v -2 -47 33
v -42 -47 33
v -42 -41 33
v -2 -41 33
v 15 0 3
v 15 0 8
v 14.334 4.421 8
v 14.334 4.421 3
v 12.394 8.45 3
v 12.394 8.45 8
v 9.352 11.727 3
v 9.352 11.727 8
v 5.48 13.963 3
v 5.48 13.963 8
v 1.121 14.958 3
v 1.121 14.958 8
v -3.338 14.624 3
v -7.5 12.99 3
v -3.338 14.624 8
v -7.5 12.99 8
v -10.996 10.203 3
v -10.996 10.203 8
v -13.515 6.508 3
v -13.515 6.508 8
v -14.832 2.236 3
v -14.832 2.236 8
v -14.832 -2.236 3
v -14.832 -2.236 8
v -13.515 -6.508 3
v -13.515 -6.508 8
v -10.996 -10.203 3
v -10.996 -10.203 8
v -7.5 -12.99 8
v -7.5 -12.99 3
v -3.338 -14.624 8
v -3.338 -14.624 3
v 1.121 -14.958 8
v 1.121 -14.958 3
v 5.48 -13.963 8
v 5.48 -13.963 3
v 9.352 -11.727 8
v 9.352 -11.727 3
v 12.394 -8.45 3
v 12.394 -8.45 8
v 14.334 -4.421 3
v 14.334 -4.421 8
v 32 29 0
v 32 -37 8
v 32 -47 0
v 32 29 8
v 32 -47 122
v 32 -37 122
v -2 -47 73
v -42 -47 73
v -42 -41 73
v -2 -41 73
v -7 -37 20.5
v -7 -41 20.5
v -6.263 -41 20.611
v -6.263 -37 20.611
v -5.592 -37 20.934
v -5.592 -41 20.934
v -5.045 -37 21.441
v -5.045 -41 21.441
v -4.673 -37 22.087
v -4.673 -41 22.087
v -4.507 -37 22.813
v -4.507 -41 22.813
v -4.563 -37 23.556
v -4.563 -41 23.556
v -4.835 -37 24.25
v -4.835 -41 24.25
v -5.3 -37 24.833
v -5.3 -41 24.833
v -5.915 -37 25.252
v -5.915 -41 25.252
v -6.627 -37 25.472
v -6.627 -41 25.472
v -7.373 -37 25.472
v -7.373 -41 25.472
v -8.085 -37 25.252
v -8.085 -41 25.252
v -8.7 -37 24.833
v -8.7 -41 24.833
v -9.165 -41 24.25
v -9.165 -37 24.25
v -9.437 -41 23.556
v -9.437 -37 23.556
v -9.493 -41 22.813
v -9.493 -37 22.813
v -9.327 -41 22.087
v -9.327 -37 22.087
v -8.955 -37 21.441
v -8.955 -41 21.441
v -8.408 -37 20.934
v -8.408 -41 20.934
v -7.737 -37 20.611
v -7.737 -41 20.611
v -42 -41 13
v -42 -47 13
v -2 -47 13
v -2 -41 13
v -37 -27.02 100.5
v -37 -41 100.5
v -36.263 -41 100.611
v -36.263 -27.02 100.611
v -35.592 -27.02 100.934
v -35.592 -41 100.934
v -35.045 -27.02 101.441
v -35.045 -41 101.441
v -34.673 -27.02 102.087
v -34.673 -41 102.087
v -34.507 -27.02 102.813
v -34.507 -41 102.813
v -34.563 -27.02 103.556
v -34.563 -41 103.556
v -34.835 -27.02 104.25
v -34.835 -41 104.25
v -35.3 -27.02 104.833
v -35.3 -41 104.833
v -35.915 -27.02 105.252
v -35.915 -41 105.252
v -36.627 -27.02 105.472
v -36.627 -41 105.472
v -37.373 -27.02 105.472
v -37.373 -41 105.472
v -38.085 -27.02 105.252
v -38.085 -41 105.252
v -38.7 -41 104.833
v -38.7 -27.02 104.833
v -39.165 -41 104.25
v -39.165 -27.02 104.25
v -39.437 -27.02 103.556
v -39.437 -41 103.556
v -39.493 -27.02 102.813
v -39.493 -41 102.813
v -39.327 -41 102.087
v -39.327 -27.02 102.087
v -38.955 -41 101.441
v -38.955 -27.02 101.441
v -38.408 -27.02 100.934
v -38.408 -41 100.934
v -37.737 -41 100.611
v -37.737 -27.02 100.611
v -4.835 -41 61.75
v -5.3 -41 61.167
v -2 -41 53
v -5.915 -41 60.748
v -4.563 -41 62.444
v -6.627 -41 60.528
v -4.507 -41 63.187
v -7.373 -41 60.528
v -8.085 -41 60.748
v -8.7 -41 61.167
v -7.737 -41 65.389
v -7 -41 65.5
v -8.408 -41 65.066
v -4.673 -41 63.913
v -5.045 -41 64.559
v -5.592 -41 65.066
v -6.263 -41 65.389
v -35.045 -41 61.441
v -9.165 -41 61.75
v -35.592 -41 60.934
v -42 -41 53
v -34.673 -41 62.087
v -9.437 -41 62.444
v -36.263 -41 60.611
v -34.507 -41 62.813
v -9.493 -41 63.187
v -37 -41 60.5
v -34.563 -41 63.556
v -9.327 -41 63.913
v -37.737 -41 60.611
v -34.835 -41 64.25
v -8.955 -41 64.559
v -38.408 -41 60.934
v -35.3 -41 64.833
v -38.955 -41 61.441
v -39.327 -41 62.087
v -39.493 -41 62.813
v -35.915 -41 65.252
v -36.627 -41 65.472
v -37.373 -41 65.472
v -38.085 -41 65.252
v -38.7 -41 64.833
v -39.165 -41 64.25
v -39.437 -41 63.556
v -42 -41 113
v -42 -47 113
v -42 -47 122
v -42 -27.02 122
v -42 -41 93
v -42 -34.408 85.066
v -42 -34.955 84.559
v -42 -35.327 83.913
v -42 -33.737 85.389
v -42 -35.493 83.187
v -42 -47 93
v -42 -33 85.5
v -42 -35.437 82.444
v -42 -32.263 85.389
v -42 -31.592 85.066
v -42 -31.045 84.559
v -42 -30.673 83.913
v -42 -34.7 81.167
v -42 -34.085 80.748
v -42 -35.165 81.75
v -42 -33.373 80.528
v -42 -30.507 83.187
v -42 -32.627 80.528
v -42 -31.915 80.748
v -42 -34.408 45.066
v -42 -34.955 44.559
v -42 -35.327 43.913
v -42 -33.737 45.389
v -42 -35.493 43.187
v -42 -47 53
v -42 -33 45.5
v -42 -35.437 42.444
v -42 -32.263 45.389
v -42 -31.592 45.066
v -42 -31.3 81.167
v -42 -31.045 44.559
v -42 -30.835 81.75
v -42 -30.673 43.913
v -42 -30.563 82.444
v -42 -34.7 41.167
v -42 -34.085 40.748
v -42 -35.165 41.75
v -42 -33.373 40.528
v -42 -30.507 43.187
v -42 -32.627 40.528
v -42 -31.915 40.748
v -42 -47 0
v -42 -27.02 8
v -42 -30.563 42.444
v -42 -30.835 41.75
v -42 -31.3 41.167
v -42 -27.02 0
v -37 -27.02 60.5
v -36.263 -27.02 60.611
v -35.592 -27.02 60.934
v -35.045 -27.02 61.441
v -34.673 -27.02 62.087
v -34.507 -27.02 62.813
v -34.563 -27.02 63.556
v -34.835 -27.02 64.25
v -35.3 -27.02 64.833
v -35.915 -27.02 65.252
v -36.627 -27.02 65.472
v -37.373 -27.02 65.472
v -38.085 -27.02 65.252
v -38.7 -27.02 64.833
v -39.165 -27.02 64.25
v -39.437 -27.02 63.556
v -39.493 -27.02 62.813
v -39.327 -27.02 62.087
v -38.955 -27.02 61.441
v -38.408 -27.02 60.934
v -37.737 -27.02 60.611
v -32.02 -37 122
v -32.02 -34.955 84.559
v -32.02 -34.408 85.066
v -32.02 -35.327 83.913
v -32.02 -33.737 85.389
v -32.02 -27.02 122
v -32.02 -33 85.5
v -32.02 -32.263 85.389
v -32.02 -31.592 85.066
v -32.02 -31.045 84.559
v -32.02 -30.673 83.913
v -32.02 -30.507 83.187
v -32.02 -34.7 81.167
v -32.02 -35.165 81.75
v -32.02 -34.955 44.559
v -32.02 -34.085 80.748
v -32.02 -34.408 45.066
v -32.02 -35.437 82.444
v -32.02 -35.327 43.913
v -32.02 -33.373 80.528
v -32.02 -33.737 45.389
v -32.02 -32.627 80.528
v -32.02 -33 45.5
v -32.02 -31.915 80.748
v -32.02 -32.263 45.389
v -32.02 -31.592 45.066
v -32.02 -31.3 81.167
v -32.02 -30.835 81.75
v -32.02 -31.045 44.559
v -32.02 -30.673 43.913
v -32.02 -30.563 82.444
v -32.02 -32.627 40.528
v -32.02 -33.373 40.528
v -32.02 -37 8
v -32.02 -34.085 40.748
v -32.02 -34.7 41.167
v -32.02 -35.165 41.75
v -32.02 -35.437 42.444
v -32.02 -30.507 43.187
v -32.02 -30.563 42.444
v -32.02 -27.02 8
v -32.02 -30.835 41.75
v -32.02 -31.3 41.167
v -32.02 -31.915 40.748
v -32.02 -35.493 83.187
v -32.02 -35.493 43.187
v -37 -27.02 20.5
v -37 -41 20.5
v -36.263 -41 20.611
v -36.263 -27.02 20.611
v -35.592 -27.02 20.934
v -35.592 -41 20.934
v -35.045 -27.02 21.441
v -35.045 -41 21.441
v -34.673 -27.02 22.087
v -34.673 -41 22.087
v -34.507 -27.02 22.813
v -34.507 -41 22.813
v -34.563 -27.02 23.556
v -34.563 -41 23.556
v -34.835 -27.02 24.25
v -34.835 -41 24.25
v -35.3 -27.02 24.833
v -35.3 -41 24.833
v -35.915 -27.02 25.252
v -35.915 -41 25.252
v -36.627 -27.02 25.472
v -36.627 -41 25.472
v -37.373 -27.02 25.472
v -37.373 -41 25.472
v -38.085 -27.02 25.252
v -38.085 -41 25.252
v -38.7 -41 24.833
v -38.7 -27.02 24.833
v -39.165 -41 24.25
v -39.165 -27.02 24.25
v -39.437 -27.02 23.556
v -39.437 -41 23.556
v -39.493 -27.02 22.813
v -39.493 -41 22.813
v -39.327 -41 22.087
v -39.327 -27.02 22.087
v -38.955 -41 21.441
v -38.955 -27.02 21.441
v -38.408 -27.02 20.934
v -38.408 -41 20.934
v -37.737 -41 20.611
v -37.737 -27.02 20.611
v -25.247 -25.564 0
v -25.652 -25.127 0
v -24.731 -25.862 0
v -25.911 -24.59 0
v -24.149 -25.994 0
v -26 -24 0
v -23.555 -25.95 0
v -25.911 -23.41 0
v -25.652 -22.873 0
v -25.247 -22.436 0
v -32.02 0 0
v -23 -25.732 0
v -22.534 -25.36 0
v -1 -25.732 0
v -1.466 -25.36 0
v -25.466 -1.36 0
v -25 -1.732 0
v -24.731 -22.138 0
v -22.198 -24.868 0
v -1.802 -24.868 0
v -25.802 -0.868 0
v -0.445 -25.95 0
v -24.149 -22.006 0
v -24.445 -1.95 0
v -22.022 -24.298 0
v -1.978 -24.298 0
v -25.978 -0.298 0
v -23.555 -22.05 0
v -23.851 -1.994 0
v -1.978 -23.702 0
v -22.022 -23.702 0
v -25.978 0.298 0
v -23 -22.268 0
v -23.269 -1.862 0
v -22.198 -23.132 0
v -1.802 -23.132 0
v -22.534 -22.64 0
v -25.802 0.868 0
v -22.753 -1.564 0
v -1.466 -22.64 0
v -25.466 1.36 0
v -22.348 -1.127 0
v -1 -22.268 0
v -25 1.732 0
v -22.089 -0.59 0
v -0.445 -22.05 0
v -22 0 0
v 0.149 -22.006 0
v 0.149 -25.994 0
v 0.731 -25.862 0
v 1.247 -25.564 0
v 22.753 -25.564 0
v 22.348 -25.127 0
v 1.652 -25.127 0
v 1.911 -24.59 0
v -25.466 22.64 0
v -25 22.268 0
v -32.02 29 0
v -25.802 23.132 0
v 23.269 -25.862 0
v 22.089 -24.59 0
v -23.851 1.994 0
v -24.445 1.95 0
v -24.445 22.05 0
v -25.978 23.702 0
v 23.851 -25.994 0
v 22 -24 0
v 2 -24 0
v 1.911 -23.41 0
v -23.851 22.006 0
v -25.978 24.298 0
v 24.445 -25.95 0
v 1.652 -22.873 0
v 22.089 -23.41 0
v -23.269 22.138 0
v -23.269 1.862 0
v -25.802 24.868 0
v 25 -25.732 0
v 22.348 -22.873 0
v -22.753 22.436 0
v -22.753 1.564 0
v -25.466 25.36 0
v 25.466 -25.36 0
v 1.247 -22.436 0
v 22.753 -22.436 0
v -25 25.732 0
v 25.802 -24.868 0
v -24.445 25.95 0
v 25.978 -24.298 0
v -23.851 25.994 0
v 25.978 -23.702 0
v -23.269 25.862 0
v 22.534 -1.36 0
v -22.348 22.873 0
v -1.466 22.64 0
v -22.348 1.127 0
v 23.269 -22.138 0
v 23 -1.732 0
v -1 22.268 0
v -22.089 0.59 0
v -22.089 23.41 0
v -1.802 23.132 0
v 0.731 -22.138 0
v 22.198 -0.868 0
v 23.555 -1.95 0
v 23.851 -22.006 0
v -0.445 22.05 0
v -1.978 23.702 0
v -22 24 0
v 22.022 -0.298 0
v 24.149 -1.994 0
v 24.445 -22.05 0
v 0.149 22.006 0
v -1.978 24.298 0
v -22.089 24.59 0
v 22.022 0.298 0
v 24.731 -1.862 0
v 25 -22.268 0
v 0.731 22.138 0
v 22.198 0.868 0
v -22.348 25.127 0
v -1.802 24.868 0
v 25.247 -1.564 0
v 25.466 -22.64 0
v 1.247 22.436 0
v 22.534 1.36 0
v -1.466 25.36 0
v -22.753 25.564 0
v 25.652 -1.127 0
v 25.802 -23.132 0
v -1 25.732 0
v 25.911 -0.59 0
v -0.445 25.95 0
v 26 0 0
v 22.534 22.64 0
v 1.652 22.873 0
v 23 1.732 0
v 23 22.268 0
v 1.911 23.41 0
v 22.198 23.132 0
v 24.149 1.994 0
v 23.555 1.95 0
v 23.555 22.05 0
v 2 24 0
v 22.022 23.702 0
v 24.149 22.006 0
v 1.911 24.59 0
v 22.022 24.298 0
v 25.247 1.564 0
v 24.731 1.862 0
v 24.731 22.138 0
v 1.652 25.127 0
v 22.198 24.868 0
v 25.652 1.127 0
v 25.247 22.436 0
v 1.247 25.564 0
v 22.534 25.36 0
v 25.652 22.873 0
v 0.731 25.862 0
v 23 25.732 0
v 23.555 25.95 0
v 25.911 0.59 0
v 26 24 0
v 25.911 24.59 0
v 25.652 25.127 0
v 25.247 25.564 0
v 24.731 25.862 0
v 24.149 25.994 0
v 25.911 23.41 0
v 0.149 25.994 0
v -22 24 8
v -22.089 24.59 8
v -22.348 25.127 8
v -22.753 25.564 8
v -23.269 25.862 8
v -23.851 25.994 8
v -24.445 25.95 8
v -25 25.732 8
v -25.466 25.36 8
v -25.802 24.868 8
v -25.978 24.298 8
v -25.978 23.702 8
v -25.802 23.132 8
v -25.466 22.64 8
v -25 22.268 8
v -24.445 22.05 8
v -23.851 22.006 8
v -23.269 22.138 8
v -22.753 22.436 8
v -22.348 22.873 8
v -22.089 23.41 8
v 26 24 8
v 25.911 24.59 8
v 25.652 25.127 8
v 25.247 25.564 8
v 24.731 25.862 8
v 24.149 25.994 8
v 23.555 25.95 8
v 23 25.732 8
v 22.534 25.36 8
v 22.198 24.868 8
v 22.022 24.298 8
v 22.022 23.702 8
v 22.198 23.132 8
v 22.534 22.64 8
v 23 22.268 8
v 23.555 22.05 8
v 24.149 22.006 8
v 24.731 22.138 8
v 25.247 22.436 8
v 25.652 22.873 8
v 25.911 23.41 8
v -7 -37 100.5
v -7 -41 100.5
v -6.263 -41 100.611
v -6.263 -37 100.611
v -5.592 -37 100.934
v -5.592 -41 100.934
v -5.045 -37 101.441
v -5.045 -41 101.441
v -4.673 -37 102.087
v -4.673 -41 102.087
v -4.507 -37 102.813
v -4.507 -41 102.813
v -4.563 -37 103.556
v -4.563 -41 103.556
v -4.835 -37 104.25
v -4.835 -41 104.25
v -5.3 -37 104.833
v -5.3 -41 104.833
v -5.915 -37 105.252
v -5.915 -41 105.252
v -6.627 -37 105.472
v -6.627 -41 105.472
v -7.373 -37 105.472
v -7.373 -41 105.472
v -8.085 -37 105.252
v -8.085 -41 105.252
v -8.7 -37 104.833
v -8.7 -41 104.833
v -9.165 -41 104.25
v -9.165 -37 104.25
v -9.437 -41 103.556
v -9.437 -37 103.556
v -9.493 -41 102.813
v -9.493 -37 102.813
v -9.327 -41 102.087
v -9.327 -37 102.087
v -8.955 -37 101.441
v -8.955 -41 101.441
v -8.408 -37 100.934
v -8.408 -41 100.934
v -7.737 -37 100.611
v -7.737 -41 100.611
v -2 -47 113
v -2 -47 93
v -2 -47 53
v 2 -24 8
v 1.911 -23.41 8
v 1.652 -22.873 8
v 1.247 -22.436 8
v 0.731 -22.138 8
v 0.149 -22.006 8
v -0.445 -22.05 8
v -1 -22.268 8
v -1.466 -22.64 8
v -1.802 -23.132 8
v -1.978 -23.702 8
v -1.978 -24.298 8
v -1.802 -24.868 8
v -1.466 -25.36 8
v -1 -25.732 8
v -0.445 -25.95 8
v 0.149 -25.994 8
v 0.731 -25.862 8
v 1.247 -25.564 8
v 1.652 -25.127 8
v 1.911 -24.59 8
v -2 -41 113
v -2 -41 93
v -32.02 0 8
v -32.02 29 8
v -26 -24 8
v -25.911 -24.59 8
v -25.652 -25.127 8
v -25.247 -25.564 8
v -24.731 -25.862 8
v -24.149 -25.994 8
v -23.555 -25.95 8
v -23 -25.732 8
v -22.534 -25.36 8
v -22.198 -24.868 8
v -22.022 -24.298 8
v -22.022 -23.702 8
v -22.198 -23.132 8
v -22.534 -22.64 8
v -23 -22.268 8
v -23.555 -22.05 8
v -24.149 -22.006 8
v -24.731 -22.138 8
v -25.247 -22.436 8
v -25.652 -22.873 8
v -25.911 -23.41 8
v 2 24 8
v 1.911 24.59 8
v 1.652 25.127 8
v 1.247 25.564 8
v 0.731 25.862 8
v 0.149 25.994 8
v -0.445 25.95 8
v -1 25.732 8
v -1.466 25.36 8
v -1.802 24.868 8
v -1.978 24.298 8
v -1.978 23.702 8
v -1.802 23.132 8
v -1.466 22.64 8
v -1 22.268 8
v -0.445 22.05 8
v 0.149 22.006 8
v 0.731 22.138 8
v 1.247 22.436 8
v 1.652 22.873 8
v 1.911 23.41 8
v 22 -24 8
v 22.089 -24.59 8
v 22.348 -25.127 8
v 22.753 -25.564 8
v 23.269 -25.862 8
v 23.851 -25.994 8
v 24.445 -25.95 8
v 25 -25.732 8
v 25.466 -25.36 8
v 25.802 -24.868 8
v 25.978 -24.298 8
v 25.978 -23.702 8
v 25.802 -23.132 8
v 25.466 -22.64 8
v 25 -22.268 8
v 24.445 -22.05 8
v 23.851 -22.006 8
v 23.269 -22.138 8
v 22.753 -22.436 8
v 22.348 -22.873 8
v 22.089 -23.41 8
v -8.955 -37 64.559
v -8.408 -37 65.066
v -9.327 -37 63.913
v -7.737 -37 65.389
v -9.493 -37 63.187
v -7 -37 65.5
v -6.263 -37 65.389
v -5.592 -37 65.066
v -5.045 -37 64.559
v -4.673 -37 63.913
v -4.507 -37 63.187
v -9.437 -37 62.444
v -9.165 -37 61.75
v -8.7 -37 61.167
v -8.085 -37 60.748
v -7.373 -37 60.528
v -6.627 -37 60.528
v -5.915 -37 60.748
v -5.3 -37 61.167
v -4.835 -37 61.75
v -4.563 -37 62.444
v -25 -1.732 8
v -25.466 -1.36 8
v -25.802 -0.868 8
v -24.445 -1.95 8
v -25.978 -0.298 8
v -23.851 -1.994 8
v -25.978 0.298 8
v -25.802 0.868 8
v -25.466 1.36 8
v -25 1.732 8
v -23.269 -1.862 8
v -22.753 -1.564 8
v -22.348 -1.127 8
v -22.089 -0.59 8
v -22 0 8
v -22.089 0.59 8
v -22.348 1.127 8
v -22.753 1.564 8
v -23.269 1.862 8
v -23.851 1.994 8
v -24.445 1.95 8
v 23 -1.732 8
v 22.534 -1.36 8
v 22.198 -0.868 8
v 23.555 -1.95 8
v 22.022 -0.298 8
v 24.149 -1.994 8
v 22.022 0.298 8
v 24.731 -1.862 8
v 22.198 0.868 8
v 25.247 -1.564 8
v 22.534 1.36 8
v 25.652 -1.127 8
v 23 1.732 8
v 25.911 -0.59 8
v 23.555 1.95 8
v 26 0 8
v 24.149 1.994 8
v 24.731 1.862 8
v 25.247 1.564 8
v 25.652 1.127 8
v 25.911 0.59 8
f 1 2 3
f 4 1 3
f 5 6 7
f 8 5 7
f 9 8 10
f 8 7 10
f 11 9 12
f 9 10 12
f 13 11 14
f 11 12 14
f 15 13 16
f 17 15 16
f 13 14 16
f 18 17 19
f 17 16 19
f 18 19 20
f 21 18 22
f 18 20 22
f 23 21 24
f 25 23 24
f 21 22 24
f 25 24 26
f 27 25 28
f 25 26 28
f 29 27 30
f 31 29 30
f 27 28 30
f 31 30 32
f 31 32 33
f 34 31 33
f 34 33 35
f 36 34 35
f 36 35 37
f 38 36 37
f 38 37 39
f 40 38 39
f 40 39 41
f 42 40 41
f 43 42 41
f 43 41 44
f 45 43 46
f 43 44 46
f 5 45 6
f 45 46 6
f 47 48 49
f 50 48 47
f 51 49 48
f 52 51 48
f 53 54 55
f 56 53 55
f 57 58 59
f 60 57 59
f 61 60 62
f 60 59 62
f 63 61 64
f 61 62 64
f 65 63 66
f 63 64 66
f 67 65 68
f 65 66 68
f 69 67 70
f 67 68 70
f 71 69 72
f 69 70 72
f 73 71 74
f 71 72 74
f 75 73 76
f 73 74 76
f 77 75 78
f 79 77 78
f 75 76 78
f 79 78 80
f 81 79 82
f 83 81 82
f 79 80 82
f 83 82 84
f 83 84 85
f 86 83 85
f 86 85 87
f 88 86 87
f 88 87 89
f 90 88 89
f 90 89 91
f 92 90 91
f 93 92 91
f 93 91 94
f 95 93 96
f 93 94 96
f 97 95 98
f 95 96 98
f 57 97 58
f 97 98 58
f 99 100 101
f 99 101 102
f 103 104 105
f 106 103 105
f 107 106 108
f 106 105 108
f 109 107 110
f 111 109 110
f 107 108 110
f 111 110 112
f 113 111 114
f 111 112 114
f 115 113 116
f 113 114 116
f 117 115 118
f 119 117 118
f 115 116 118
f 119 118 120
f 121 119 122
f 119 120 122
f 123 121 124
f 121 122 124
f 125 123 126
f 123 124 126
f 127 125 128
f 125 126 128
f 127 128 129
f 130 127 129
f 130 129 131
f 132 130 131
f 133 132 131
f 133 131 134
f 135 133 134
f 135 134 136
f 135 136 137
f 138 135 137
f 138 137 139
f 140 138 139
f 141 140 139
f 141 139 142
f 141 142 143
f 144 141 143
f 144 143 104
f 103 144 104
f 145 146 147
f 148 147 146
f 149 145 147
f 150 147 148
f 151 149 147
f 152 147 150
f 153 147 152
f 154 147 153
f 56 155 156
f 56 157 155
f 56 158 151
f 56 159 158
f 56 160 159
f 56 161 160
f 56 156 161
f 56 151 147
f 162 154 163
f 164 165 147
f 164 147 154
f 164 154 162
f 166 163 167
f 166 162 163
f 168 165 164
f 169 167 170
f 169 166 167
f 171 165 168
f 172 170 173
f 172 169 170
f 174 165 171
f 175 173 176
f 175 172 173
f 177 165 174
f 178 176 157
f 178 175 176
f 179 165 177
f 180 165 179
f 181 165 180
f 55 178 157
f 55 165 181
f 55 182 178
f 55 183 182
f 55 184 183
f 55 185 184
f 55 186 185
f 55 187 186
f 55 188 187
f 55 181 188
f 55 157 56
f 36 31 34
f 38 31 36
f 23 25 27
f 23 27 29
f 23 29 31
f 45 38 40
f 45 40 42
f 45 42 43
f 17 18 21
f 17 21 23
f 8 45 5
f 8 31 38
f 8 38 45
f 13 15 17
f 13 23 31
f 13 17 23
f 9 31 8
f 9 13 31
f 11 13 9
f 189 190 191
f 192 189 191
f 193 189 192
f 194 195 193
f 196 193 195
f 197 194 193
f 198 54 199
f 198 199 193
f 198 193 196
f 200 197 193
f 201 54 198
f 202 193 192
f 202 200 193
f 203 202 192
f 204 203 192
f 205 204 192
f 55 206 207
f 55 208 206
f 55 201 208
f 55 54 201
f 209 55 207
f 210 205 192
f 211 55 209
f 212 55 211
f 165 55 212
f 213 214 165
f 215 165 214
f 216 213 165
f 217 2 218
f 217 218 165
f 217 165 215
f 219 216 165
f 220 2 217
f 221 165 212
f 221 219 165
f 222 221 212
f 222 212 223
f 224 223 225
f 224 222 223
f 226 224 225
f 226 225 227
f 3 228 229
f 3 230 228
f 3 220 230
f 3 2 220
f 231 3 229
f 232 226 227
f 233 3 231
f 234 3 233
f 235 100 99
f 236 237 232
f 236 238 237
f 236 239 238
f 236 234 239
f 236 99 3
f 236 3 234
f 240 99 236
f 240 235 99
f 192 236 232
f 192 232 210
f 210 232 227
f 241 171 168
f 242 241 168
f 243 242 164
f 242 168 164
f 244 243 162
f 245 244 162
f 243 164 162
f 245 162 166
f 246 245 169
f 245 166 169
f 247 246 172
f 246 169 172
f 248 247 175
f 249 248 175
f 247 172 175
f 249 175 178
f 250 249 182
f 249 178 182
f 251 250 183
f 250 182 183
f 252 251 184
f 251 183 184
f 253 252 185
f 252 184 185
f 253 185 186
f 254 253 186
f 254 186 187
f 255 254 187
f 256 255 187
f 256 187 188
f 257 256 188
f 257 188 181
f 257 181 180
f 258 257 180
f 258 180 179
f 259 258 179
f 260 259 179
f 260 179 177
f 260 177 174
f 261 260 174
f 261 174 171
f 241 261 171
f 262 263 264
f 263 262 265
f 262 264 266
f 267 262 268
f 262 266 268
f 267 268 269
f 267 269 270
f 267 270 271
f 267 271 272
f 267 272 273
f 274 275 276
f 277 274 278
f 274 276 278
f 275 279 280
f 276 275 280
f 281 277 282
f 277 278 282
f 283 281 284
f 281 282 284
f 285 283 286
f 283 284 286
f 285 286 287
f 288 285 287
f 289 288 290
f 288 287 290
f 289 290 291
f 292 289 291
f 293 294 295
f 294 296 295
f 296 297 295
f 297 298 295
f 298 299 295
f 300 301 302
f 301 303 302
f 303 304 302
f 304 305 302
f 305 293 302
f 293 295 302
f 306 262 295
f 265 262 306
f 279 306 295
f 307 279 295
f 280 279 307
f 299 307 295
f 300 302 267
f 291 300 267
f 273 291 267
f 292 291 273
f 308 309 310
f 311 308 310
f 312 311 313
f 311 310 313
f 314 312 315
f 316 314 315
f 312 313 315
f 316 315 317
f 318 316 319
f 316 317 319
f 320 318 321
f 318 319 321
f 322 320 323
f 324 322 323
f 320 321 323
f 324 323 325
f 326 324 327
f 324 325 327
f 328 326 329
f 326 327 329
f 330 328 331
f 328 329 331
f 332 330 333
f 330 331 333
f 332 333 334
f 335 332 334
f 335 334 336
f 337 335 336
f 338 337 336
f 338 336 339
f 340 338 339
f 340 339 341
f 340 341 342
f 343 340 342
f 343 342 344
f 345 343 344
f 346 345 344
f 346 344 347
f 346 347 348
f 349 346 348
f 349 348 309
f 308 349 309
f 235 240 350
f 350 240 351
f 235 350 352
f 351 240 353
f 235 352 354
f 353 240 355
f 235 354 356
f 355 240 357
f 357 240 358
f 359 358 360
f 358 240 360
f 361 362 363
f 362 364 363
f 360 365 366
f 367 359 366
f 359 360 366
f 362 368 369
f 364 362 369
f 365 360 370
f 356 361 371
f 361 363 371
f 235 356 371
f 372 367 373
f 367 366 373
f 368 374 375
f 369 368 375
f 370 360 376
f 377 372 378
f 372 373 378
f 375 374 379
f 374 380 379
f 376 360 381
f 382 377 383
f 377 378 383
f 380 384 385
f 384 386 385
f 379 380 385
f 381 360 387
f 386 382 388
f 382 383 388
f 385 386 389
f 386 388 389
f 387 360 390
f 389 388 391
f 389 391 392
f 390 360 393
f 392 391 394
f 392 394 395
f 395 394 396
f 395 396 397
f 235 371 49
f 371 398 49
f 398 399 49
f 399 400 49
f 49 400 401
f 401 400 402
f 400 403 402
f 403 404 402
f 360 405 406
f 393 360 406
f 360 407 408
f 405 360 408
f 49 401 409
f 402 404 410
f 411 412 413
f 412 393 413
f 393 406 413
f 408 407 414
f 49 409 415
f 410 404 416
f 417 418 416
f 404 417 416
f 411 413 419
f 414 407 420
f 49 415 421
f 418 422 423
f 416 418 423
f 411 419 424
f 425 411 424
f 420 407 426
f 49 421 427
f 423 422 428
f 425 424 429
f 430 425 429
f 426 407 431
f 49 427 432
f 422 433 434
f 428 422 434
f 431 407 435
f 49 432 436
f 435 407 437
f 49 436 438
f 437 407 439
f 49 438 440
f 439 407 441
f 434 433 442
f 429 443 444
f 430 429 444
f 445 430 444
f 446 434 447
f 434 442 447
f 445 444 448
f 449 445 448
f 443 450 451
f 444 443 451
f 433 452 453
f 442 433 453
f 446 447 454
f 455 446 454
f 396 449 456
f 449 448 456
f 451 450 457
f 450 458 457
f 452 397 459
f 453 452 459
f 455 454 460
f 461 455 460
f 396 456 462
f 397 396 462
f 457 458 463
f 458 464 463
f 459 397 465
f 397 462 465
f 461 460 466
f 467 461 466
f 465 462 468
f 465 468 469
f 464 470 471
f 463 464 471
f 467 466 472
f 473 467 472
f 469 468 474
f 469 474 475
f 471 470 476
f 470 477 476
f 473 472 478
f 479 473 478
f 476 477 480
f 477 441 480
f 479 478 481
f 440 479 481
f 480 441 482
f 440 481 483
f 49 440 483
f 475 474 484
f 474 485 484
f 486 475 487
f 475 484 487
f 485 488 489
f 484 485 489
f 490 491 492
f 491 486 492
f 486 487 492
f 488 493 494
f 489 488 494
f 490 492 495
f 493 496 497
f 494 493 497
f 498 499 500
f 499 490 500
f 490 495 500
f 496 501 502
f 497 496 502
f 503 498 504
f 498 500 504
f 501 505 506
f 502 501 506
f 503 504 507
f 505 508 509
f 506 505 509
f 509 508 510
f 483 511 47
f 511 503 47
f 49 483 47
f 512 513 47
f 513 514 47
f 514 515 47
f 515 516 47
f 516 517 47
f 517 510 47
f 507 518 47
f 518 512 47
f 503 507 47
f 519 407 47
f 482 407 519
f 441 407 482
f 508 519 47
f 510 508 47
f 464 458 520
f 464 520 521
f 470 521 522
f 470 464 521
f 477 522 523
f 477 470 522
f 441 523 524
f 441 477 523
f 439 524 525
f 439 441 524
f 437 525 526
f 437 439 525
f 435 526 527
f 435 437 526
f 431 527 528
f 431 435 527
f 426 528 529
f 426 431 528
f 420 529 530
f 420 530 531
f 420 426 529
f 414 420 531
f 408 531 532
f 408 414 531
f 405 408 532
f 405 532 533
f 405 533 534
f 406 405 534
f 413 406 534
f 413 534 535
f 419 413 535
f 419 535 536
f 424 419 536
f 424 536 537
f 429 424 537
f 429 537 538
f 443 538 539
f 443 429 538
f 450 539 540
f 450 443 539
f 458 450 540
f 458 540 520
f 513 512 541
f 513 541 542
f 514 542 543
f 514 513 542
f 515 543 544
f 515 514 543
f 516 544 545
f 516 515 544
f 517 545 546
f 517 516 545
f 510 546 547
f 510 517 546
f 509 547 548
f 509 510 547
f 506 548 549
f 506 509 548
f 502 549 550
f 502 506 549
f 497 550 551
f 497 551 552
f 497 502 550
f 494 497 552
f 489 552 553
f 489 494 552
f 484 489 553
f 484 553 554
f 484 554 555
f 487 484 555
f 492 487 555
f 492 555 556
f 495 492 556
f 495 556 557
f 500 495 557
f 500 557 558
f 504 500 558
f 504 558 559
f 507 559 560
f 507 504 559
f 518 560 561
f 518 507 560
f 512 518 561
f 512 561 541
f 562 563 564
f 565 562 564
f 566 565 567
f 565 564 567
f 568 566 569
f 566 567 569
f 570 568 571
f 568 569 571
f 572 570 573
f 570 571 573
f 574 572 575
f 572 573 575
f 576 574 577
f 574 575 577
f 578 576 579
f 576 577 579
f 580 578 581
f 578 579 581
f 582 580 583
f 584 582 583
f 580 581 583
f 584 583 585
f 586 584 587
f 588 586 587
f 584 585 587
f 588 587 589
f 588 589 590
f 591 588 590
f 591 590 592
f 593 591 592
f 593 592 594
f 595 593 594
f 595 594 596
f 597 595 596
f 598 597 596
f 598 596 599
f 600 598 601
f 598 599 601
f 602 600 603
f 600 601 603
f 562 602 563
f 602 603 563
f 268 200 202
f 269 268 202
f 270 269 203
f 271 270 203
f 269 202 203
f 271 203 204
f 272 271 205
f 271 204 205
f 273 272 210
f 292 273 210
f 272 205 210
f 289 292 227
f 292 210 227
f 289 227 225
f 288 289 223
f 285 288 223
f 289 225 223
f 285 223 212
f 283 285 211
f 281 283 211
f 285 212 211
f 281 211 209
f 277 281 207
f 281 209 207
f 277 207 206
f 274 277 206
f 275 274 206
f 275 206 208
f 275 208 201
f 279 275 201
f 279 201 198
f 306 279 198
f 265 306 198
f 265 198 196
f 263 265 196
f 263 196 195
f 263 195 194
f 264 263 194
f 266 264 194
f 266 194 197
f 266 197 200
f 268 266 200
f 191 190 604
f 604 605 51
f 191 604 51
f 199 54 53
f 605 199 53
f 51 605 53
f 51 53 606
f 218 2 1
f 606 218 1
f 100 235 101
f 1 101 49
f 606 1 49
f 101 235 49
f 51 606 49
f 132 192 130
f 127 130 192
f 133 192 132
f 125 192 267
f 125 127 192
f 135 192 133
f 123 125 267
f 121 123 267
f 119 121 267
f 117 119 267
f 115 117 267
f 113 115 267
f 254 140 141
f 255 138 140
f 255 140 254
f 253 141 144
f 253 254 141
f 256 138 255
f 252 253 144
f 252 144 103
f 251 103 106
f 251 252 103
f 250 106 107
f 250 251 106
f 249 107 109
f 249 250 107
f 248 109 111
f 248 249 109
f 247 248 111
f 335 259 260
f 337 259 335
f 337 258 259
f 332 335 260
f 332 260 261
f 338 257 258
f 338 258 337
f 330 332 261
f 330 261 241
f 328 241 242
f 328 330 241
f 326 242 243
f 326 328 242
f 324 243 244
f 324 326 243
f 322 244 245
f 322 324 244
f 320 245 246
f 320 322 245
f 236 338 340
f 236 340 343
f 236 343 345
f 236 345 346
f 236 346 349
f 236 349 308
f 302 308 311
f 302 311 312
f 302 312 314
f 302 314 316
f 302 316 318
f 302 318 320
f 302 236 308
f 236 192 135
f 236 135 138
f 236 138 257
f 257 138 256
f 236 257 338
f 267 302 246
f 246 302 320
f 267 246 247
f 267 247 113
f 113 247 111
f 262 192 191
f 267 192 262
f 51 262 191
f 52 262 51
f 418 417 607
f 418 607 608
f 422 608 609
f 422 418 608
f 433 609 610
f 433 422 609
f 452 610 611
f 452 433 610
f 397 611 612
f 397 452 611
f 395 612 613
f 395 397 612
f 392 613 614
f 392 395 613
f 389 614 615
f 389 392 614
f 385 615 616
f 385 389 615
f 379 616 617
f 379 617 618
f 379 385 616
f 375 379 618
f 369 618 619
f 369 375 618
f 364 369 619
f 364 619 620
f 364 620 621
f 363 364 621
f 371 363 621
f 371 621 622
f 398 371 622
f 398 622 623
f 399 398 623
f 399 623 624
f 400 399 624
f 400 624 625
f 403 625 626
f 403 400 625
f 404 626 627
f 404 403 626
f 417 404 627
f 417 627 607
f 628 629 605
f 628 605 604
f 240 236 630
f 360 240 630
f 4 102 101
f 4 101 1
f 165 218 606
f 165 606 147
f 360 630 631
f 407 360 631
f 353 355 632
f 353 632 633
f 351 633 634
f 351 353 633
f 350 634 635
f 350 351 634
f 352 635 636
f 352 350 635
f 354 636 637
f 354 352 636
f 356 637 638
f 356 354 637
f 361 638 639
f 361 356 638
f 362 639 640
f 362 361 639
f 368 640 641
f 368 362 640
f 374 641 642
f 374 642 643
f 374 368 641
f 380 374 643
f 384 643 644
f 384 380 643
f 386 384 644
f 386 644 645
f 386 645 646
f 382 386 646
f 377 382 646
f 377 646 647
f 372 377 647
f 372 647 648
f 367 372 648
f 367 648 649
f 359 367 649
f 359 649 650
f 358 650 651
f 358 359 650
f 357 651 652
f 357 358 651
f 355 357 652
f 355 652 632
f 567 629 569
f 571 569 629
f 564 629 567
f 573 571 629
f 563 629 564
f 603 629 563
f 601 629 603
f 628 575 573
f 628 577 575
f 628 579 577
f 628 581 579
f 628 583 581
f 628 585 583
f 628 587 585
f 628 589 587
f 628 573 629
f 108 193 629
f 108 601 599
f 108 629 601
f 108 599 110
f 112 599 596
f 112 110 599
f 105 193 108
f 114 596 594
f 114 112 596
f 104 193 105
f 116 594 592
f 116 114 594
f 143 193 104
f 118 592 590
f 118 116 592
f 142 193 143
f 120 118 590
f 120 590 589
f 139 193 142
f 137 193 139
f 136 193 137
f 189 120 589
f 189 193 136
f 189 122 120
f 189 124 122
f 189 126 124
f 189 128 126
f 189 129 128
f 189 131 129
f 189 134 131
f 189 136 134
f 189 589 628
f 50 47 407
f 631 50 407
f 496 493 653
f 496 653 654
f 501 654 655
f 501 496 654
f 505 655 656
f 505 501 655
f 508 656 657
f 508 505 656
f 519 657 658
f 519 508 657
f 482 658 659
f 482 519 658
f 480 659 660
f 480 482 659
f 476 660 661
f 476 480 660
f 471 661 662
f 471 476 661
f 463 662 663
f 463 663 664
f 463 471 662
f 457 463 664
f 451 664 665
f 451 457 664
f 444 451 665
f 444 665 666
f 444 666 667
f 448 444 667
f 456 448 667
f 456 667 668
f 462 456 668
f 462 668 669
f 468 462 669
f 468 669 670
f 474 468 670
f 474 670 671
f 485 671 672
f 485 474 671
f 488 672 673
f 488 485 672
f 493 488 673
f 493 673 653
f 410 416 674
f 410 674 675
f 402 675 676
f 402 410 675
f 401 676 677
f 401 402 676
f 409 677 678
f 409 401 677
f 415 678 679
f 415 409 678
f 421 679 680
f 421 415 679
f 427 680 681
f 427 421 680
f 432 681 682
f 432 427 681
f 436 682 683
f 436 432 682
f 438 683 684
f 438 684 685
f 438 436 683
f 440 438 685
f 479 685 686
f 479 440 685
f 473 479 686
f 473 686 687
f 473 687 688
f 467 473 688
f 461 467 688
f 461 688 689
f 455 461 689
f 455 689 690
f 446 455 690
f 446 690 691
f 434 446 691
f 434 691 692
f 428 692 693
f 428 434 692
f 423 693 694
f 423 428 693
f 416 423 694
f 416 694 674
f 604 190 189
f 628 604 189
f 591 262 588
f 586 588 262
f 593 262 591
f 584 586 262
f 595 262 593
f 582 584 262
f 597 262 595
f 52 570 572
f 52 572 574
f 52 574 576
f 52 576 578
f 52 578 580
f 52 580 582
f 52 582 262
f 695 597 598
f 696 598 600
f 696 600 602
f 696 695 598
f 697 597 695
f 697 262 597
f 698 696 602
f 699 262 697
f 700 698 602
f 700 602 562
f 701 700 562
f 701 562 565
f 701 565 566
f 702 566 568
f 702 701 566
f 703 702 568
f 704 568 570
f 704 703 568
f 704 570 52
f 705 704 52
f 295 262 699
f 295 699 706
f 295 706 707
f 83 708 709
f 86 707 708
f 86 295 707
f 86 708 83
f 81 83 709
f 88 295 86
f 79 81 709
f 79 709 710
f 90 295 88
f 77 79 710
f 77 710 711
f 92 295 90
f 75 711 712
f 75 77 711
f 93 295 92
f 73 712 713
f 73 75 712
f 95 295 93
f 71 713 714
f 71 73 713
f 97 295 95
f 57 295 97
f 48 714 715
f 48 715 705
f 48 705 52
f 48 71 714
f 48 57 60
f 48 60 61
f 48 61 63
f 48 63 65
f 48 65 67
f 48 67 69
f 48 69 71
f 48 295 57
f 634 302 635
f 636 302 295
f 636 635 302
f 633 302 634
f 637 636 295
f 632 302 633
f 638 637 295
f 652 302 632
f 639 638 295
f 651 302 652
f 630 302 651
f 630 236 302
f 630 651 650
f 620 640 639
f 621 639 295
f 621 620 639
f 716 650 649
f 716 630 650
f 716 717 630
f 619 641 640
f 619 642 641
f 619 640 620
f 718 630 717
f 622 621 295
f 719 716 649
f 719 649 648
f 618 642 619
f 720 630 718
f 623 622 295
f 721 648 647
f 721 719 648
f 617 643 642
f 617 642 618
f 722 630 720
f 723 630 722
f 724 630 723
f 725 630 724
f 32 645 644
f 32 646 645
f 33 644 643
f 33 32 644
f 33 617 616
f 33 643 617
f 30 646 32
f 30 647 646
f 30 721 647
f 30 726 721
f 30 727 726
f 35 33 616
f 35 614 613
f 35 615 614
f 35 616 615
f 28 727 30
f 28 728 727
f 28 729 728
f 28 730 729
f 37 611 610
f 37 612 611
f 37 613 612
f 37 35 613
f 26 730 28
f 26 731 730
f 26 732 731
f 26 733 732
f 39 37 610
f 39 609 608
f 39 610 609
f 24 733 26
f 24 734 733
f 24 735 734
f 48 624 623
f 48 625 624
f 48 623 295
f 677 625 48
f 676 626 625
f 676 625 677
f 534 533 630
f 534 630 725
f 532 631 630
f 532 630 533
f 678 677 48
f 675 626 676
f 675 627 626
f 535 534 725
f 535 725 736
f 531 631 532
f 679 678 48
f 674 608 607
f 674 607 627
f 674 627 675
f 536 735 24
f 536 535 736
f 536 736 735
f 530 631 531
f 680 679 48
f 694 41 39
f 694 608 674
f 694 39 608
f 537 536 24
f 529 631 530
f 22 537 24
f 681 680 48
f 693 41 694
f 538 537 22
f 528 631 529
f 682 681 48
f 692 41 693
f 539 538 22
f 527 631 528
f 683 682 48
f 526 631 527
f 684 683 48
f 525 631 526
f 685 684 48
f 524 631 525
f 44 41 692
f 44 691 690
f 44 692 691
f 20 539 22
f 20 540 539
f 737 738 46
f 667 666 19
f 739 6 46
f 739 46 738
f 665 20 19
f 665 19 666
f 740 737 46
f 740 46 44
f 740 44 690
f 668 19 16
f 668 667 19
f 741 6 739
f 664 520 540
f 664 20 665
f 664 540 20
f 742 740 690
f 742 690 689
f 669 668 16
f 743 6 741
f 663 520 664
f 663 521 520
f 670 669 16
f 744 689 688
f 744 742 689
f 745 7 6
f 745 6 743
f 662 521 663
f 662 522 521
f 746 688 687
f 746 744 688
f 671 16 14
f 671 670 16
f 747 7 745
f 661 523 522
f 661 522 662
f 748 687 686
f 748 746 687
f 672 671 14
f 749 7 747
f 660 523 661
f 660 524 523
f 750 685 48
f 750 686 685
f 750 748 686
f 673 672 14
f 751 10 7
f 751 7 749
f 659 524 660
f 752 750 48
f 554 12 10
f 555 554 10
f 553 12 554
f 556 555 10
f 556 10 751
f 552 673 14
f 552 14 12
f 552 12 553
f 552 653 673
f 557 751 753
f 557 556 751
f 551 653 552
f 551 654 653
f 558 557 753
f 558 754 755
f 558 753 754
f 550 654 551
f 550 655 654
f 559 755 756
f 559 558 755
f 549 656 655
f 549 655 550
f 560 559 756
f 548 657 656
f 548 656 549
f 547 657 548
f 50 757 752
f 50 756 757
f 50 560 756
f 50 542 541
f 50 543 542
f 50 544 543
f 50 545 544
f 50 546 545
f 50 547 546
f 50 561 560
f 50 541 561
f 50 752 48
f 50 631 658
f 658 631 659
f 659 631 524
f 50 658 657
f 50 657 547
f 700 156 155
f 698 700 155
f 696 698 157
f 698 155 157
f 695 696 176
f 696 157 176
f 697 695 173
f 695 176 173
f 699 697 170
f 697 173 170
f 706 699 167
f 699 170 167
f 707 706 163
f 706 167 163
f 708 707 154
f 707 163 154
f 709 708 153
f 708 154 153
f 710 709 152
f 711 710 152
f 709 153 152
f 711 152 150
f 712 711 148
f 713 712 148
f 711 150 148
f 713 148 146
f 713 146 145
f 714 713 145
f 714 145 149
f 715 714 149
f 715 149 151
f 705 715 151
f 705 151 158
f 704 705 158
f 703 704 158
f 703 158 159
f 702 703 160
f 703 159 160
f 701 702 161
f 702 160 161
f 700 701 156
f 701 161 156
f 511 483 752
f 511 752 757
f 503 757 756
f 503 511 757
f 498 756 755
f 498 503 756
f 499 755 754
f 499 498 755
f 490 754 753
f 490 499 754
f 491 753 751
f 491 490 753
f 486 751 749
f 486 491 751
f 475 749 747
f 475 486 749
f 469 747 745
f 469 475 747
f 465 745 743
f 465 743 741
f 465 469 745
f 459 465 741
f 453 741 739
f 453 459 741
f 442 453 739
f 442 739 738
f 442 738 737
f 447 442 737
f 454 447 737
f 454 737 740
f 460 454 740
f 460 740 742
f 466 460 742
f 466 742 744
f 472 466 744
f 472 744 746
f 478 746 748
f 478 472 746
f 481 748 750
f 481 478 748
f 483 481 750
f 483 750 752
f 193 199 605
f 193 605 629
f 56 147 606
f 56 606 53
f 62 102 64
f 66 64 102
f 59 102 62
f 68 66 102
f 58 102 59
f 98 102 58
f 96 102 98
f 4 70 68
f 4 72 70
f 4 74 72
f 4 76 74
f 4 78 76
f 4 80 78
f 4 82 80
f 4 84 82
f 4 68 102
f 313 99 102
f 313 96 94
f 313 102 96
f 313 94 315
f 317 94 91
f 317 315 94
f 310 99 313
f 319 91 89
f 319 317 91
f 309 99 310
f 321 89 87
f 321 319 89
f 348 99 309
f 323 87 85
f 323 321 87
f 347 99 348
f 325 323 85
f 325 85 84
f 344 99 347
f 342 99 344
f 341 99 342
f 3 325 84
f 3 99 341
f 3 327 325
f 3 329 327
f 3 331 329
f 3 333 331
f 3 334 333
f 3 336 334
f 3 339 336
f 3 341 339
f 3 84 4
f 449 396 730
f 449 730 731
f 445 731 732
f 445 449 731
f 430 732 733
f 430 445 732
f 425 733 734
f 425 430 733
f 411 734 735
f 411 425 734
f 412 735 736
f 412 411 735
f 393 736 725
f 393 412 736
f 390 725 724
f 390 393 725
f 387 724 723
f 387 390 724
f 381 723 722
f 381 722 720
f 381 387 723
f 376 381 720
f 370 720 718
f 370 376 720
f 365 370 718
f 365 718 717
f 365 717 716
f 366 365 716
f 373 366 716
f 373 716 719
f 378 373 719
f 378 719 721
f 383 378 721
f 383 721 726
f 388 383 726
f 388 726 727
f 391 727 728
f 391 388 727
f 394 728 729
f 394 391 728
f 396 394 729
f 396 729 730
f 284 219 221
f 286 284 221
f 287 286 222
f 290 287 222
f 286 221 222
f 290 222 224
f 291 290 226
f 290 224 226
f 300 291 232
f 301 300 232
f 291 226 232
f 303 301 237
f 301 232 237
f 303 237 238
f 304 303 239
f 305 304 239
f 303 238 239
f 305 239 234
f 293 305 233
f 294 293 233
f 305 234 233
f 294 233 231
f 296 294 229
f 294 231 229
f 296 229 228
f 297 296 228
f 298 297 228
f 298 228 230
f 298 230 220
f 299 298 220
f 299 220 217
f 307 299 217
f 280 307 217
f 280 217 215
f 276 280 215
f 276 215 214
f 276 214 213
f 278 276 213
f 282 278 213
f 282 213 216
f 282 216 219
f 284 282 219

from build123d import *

# Parameters (mm, degrees)
SKETCH1_W           = 58
SKETCH1_H           = 58
SKETCH1_R           = 2
BOSS_EXTRUDE1_DEPTH = 8
SKETCH13_R          = 15
CUT_EXTRUDE5_DEPTH  = 5
BOSS_EXTRUDE7_DEPTH = 8
SKETCH21_W          = 84
SKETCH21_H          = 10
BOSS_EXTRUDE8_DEPTH = 114
SKETCH22_W          = 9.98
SKETCH22_H          = 9.98
BOSS_EXTRUDE9_DEPTH = 114
SKETCH29_W          = 20
SKETCH29_H          = 6
CUT_EXTRUDE6_DEPTH  = 40
SKETCH30_W          = 10
SKETCH30_H          = 76
CUT_EXTRUDE7_DEPTH  = 138.320792308
SKETCH31_R          = 2.5
CUT_EXTRUDE8_DEPTH  = 4
SKETCH34_R          = 2.5
CUT_EXTRUDE9_DEPTH  = 10
SKETCH36_R          = 2.5
CUT_EXTRUDE10_DEPTH = 20
CUT_EXTRUDE12_DEPTH = 15


with BuildPart() as part:
    # Sketch1 → Boss-Extrude1 (new body)
    with BuildSketch(Plane.XY):
        Rectangle(SKETCH1_W, SKETCH1_H)
        with Locations((0, 24)):
            Circle(SKETCH1_R, mode=Mode.SUBTRACT)
        with Locations((-24, 24)):
            Circle(SKETCH1_R, mode=Mode.SUBTRACT)
        with Locations((24, 0)):
            Circle(SKETCH1_R, mode=Mode.SUBTRACT)
        with Locations((0, -24)):
            Circle(SKETCH1_R, mode=Mode.SUBTRACT)
        with Locations((-24, 0)):
            Circle(SKETCH1_R, mode=Mode.SUBTRACT)
        with Locations(Location((24, -24, 0), (0, 0, 180))):
            Circle(SKETCH1_R, mode=Mode.SUBTRACT)
        with Locations((24, 24)):
            Circle(SKETCH1_R, mode=Mode.SUBTRACT)
        with Locations(Location((-24, -24, 0), (0, 0, 180))):
            Circle(SKETCH1_R, mode=Mode.SUBTRACT)
    extrude(amount=BOSS_EXTRUDE1_DEPTH)

    # Sketch13 → Cut-Extrude5 (cut)
    with BuildSketch(Plane.XY.offset(8)):
        Circle(SKETCH13_R)
    extrude(amount=-CUT_EXTRUDE5_DEPTH, mode=Mode.SUBTRACT)

    # Sketch15 → Boss-Extrude7 (add)
    with BuildSketch(Plane.XY):
        Polygon((29, -29), (-29, -29), (-29, 29), (-42, 29), (-42, -29), (-42, -47), (42, -47), (42, -29), (42, 29), (29, 29), align=None)
    extrude(amount=BOSS_EXTRUDE7_DEPTH)

    # Sketch21 → Boss-Extrude8 (add)
    with BuildSketch(Plane.XY.offset(8)):
        with Locations((0, -42)):
            Rectangle(SKETCH21_W, SKETCH21_H)
    extrude(amount=BOSS_EXTRUDE8_DEPTH)

    # Sketch22 → Boss-Extrude9 (add)
    with BuildSketch(Plane.XY.offset(8)):
        with Locations((-37.01, -32.01)):
            Rectangle(SKETCH22_W, SKETCH22_H)
    extrude(amount=BOSS_EXTRUDE9_DEPTH)

    # Sketch29 → Cut-Extrude6 (cut)
    with BuildSketch(Plane.ZY.offset(42)):
        with Locations((103, -44)):
            Rectangle(SKETCH29_W, SKETCH29_H)
        with Locations((63, -44)):
            Rectangle(SKETCH29_W, SKETCH29_H)
        with Locations((23, -44)):
            Rectangle(SKETCH29_W, SKETCH29_H)
    extrude(amount=-CUT_EXTRUDE6_DEPTH, mode=Mode.SUBTRACT)

    # Sketch30 → Cut-Extrude7 (cut, through all)
    with BuildSketch(Plane.XY.offset(122)):
        with Locations((37, -9)):
            Rectangle(SKETCH30_W, SKETCH30_H)
    extrude(amount=-CUT_EXTRUDE7_DEPTH, mode=Mode.SUBTRACT)

    # Sketch31 → Cut-Extrude8 (cut)
    with BuildSketch(Plane.XZ.offset(41)):
        with Locations(Location((-7, 103, 0), (0, 0, 270))):
            Circle(SKETCH31_R)
        with Locations(Location((-7, 63, 0), (0, 0, 90))):
            Circle(SKETCH31_R)
        with Locations(Location((-7, 23, 0), (0, 0, 270))):
            Circle(SKETCH31_R)
    extrude(amount=-CUT_EXTRUDE8_DEPTH, mode=Mode.SUBTRACT)

    # Sketch34 → Cut-Extrude9 (cut)
    with BuildSketch(Plane.ZY.offset(42)):
        with Locations((43, -33)):
            Circle(SKETCH34_R)
        with Locations((83, -33)):
            Circle(SKETCH34_R)
    extrude(amount=-CUT_EXTRUDE9_DEPTH, mode=Mode.SUBTRACT)

    # Sketch36 → Cut-Extrude10 (cut)
    with BuildSketch(Plane.XZ.offset(41)):
        with Locations(Location((-37, 103, 0), (0, 0, 270))):
            Circle(SKETCH36_R)
        with Locations(Location((-37, 23, 0), (0, 0, 270))):
            Circle(SKETCH36_R)
        with Locations(Location((-37, 63, 0), (0, 0, 270))):
            Circle(SKETCH36_R)
    extrude(amount=-CUT_EXTRUDE10_DEPTH, mode=Mode.SUBTRACT)

    # Sketch37 → Cut-Extrude12 (cut)
    with BuildSketch(Plane.XY.offset(8)):
        Polygon((-42, -27.02), (-32.02, 0), (-32.02, 29), (-42, 29), align=None)
    extrude(amount=-CUT_EXTRUDE12_DEPTH, mode=Mode.SUBTRACT)


solid = part.part
